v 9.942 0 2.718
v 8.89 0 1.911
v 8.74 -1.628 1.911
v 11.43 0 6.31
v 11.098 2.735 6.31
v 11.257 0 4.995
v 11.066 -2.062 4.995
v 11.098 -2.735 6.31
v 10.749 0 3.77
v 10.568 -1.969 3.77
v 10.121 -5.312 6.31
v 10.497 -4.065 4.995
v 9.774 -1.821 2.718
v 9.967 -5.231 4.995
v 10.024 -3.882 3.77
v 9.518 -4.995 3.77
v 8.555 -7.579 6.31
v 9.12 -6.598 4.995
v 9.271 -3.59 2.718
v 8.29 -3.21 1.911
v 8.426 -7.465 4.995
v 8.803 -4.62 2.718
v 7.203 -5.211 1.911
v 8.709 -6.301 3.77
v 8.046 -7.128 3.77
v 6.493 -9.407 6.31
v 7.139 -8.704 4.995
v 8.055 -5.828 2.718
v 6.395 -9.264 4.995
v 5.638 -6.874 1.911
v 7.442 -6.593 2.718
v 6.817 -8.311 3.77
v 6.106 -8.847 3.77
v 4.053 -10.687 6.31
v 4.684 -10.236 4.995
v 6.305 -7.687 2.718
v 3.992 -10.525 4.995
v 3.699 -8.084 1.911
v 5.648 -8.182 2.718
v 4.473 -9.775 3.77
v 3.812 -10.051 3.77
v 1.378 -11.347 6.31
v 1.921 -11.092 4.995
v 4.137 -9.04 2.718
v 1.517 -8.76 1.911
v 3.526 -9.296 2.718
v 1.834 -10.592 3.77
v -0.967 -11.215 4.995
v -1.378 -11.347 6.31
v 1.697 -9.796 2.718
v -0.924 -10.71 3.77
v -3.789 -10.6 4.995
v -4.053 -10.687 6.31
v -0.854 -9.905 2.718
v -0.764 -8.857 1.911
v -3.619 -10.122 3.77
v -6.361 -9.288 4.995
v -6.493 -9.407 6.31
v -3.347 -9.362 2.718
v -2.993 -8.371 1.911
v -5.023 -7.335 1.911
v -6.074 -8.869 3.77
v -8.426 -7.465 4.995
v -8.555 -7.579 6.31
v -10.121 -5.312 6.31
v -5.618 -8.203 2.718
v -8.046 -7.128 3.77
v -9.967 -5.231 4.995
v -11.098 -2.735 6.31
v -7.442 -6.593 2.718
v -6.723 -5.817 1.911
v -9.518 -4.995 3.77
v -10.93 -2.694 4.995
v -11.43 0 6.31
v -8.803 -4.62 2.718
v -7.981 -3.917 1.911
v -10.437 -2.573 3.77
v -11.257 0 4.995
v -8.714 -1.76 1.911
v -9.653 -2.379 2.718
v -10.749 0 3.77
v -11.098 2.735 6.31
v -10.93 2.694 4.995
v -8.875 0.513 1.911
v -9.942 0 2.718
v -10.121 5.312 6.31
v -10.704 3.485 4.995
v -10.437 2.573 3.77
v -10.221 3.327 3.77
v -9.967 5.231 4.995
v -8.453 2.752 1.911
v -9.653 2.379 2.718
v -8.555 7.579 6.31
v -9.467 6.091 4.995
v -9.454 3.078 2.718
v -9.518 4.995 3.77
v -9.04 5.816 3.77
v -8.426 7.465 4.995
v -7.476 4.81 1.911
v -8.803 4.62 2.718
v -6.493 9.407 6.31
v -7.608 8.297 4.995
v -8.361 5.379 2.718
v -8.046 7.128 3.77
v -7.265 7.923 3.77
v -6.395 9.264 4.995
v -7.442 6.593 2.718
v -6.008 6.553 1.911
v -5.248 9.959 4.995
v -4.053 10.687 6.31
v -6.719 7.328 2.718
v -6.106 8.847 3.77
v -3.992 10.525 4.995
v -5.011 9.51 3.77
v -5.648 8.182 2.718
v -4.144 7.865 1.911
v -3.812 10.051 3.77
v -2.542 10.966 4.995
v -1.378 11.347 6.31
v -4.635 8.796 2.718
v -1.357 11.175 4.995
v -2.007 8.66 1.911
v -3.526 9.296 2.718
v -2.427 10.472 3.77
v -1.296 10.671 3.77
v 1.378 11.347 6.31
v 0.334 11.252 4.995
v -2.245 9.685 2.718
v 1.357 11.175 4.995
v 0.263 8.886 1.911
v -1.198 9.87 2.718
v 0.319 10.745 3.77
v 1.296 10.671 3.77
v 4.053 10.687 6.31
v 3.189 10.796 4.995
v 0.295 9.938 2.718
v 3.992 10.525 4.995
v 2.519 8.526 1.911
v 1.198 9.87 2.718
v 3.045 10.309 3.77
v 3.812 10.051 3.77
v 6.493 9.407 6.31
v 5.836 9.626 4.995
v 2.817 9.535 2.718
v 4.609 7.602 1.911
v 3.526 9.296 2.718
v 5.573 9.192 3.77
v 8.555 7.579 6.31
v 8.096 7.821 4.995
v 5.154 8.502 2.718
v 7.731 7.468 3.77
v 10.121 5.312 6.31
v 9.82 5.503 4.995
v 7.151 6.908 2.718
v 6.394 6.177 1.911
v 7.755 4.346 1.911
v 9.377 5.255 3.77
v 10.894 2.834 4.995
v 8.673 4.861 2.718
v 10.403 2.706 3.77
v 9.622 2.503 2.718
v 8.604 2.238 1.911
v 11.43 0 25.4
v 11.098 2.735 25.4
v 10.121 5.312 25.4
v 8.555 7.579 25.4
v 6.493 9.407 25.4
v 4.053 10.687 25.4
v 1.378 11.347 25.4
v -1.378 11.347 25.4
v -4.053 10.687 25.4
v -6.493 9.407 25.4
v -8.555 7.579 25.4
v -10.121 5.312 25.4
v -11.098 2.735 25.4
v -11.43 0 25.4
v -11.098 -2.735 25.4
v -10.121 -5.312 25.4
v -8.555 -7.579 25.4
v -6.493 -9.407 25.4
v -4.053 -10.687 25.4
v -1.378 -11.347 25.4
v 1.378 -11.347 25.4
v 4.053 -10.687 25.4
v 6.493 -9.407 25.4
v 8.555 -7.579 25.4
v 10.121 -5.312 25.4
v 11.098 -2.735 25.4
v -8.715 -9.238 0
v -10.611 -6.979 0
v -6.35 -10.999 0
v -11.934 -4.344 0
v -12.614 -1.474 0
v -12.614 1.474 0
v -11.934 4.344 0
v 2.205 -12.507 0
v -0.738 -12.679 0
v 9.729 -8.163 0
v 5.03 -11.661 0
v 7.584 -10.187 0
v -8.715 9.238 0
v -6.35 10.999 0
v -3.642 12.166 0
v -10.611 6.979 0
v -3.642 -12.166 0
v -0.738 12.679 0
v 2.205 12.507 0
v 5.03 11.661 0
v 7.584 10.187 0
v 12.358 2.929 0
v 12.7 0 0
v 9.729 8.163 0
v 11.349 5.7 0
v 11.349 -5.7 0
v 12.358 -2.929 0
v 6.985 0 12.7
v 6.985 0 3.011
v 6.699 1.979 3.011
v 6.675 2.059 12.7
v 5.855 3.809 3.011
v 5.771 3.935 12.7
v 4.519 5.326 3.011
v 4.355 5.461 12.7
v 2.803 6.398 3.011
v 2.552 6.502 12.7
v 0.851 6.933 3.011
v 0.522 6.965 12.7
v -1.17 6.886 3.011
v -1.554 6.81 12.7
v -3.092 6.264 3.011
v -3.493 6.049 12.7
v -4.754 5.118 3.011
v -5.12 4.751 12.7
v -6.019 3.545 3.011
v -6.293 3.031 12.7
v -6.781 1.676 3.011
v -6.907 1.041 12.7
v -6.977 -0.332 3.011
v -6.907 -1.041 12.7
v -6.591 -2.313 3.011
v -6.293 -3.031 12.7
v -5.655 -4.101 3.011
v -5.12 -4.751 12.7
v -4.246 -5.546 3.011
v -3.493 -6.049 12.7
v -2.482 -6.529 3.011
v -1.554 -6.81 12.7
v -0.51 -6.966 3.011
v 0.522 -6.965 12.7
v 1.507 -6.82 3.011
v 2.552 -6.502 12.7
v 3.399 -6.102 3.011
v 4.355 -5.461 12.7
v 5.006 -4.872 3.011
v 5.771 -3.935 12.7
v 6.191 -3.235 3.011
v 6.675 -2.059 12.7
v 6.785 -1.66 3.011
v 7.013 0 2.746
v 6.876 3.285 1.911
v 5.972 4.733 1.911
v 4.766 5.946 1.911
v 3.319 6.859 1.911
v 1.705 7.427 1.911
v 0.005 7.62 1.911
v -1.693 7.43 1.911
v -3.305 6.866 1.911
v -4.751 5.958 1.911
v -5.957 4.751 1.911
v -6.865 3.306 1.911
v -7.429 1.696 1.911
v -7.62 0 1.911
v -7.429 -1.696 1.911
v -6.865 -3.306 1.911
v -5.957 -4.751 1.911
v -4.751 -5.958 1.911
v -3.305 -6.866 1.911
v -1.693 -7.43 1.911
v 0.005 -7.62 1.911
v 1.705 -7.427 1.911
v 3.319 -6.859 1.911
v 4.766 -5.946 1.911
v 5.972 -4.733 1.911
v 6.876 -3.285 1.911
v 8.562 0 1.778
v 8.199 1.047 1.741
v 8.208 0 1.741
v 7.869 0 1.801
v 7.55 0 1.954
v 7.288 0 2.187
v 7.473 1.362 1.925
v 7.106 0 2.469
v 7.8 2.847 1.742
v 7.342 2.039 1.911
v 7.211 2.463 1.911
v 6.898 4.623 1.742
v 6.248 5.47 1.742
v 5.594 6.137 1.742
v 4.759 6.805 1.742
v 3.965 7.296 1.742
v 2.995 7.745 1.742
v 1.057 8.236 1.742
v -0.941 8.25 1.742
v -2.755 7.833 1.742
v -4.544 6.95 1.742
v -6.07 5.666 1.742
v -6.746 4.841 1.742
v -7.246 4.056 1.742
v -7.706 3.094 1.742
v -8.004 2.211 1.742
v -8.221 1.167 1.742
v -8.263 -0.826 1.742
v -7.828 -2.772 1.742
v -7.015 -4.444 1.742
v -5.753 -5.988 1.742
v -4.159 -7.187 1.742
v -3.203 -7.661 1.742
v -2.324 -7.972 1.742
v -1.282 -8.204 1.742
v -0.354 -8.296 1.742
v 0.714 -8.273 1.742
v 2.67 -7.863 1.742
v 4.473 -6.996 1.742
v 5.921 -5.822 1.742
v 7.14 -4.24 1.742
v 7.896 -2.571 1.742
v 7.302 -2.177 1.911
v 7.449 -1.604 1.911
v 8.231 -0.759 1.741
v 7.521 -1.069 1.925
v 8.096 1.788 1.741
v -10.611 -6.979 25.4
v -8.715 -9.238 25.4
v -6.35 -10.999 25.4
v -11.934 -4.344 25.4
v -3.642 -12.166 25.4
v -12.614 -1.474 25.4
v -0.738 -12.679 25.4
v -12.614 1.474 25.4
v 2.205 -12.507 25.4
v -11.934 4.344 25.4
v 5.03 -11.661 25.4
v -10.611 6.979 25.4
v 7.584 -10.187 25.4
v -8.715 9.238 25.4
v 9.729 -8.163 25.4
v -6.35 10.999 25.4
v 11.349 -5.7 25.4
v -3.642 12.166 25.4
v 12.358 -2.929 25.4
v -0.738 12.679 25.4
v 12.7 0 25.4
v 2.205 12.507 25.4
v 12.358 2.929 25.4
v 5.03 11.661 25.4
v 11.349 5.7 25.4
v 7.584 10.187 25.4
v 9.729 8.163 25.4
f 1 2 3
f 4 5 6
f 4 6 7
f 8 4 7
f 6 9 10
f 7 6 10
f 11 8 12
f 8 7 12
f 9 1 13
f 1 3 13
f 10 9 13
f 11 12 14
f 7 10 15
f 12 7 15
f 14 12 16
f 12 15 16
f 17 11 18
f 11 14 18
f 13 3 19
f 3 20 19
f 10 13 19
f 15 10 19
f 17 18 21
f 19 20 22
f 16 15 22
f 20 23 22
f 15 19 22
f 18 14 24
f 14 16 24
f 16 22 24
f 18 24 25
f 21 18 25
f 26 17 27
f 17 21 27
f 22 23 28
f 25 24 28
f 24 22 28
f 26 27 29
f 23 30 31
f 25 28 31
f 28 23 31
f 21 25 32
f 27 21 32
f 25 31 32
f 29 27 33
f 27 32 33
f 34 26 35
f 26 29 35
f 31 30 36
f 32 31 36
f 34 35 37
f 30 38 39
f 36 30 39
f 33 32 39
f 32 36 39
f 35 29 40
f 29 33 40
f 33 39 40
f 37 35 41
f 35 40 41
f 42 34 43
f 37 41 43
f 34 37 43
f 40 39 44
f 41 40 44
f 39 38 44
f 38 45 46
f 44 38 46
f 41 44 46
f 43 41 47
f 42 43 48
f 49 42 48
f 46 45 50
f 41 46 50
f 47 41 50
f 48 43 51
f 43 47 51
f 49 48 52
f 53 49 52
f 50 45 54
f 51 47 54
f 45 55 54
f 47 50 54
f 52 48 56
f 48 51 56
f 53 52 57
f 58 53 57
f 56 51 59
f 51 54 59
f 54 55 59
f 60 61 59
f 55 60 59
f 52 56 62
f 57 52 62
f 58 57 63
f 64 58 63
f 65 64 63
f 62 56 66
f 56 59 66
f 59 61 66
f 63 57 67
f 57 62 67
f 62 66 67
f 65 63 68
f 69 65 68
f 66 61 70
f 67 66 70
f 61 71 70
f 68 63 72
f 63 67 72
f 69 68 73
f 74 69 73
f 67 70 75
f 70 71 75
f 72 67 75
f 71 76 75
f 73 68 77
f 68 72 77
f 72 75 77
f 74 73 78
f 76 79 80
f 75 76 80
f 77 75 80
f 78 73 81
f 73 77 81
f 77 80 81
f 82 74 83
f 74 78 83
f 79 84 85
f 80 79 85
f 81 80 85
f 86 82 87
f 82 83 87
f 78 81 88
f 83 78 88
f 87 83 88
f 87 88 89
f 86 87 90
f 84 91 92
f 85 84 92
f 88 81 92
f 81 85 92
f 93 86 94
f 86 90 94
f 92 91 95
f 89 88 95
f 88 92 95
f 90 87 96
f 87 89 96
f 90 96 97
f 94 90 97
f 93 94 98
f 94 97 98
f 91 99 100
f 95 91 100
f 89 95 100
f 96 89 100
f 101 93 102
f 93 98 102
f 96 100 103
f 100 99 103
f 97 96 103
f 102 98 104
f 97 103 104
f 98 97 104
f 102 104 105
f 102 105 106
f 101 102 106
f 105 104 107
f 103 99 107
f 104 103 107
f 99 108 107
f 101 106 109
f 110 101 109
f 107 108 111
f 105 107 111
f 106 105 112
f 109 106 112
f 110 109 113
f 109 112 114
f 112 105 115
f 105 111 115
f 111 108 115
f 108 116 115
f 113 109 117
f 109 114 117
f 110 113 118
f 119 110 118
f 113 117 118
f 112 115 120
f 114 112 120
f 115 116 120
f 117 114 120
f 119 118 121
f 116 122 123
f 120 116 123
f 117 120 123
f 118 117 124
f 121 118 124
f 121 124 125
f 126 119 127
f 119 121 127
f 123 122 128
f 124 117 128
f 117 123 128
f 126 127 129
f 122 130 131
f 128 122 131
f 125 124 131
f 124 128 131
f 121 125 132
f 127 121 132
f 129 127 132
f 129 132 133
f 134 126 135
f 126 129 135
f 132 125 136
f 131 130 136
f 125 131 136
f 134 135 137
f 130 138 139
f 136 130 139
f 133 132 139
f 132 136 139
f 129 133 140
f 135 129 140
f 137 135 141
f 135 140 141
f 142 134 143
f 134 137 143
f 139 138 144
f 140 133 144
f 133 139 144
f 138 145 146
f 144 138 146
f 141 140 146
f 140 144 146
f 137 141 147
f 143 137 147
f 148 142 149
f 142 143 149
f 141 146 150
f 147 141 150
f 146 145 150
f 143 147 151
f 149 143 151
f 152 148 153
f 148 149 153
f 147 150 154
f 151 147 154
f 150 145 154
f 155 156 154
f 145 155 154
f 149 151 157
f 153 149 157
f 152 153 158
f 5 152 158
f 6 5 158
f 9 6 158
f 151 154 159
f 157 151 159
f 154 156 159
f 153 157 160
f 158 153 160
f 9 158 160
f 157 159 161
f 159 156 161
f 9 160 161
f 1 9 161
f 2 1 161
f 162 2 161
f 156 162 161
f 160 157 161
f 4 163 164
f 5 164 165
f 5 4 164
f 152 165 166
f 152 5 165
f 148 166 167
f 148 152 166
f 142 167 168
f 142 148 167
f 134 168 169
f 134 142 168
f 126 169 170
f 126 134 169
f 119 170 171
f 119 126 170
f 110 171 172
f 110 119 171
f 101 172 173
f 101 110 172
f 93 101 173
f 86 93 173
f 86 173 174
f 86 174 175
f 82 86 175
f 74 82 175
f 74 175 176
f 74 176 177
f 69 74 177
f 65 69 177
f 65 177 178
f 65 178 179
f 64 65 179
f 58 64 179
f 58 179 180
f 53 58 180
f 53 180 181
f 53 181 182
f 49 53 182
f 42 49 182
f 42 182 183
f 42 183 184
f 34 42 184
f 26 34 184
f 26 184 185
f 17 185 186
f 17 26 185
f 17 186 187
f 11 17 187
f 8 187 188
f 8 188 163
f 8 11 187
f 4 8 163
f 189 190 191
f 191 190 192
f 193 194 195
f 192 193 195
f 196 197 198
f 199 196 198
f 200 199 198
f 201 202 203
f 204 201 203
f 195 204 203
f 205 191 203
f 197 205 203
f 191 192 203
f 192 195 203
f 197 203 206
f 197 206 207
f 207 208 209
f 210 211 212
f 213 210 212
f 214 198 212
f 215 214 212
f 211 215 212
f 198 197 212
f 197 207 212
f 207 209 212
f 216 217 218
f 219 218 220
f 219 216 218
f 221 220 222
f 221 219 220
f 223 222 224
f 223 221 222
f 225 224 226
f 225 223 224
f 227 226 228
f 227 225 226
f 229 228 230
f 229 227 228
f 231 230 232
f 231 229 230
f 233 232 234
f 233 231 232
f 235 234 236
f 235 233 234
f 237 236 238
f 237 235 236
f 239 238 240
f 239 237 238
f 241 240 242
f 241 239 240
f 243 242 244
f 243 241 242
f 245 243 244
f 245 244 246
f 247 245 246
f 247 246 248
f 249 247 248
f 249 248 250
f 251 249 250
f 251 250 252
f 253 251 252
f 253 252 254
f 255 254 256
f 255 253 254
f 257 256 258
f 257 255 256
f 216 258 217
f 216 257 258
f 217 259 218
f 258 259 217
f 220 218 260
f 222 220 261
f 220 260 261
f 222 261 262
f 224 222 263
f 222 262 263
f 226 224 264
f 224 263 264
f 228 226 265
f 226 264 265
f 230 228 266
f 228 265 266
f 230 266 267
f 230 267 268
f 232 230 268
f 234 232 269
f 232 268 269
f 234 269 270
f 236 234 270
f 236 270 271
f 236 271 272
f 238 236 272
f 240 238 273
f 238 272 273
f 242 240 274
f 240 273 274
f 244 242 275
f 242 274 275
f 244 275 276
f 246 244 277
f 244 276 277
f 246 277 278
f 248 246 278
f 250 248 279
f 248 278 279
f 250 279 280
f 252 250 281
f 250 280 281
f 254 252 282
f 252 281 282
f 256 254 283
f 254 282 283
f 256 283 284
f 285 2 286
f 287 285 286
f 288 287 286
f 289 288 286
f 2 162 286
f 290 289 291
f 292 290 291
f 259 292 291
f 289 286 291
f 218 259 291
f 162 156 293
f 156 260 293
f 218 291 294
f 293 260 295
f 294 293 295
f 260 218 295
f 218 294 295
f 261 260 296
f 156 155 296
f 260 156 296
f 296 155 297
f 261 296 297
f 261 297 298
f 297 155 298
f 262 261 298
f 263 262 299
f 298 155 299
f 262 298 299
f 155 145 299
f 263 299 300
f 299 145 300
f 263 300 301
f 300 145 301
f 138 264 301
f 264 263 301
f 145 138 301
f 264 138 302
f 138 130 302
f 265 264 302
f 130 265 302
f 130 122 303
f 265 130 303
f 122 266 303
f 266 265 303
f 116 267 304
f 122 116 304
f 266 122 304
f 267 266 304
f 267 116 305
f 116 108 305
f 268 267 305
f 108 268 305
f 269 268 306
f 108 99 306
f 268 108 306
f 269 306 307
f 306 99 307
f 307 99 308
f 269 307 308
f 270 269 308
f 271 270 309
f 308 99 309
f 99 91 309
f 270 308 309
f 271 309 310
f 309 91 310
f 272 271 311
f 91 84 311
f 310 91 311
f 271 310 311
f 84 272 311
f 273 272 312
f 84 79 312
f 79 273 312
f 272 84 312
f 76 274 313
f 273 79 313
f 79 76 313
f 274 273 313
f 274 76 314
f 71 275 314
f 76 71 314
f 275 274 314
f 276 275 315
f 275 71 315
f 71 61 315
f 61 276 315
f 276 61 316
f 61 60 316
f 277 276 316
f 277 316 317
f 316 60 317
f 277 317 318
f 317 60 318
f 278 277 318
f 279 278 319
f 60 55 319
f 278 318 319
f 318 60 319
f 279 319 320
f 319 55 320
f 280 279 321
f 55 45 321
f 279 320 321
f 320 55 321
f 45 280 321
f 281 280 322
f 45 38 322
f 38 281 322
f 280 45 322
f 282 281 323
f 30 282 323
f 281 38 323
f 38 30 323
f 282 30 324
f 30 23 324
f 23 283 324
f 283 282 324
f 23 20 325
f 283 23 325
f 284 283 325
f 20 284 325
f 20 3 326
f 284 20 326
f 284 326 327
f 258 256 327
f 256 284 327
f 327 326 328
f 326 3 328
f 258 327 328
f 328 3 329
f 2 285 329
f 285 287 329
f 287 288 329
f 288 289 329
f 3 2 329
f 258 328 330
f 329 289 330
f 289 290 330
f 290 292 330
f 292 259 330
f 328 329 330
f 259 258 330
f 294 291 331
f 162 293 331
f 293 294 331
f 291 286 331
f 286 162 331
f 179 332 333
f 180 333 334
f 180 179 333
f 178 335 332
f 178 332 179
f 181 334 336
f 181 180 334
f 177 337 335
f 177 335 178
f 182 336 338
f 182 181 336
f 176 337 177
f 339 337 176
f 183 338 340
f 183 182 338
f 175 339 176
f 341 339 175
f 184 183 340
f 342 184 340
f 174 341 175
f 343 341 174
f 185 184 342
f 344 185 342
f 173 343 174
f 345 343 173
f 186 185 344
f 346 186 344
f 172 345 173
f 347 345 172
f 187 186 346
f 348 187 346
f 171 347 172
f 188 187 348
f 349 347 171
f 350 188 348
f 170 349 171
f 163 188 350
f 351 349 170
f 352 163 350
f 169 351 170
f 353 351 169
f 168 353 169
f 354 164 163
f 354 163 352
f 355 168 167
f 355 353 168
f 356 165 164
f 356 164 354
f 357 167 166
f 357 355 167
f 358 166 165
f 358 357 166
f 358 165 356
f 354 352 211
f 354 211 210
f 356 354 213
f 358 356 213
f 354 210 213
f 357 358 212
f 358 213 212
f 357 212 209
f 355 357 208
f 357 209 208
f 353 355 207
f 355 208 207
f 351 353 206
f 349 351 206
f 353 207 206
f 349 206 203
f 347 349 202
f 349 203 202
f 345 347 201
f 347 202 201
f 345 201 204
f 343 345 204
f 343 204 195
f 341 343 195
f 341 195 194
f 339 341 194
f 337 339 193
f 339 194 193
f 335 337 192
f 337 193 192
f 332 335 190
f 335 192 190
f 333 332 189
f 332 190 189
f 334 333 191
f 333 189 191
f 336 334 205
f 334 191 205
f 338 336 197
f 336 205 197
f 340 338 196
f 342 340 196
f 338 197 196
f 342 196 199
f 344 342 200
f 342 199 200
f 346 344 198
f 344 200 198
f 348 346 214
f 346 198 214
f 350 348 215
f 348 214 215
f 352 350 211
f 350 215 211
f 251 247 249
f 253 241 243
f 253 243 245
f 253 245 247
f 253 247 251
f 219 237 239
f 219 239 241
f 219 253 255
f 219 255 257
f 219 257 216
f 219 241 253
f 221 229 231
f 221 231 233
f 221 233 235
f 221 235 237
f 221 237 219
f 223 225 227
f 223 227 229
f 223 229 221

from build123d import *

# Parameters (mm, degrees)
F0_R     = 12.7
F1_DEPTH = 25.4
F2_T     = -1.27
F4_R     = 6.985
F5_DEPTH = 11.43
F7_R     = 1.27


# Not quite as in the source:
# - a fillet or chamfer that OpenCascade refuses, or shapes differently, is made with other operations: its cross-section is extruded or revolved along the edge and cut away or added


with BuildPart() as f1:
    # F0 (on Top) → F1 (new body)
    with BuildSketch(Plane.XY):
        Circle(F0_R)
    extrude(amount=F1_DEPTH)

    # F2
    f2_openings = [f1.faces().sort_by_distance(p)[0] for p in [
        (0, 0, 25.4),
    ]]
    offset(amount=F2_T, openings=f2_openings)

    # F4 (on offset) → F5 (join, through all)
    with BuildSketch(Plane.XY.offset(12.7)):
        Circle(F4_R)
    extrude(amount=-F5_DEPTH)

    # F6: fillet of radius 5.08 on 1 edges, made by hand

    # F6_s1 → F6_t2 (revolve)
    with BuildSketch(Plane.XZ):
        with BuildLine():
            ThreePointArc((11.43, 6.3101562476), (10.16, 2.9500520825), (6.985, 1.27))
            Line((6.985, 1.27), (11.43, 1.27))
            Line((11.43, 1.27), (11.43, 6.3101562476))
        make_face()
    revolve(axis=Axis((0, 0, 1.27), (0, 0, -1)))

    # F7
    f7_edges = [f1.edges().sort_by_distance(p)[0] for p in [
        (-6.985, 0, 1.27),
    ]]
    fillet(f7_edges, radius=F7_R)


solid = f1.part
